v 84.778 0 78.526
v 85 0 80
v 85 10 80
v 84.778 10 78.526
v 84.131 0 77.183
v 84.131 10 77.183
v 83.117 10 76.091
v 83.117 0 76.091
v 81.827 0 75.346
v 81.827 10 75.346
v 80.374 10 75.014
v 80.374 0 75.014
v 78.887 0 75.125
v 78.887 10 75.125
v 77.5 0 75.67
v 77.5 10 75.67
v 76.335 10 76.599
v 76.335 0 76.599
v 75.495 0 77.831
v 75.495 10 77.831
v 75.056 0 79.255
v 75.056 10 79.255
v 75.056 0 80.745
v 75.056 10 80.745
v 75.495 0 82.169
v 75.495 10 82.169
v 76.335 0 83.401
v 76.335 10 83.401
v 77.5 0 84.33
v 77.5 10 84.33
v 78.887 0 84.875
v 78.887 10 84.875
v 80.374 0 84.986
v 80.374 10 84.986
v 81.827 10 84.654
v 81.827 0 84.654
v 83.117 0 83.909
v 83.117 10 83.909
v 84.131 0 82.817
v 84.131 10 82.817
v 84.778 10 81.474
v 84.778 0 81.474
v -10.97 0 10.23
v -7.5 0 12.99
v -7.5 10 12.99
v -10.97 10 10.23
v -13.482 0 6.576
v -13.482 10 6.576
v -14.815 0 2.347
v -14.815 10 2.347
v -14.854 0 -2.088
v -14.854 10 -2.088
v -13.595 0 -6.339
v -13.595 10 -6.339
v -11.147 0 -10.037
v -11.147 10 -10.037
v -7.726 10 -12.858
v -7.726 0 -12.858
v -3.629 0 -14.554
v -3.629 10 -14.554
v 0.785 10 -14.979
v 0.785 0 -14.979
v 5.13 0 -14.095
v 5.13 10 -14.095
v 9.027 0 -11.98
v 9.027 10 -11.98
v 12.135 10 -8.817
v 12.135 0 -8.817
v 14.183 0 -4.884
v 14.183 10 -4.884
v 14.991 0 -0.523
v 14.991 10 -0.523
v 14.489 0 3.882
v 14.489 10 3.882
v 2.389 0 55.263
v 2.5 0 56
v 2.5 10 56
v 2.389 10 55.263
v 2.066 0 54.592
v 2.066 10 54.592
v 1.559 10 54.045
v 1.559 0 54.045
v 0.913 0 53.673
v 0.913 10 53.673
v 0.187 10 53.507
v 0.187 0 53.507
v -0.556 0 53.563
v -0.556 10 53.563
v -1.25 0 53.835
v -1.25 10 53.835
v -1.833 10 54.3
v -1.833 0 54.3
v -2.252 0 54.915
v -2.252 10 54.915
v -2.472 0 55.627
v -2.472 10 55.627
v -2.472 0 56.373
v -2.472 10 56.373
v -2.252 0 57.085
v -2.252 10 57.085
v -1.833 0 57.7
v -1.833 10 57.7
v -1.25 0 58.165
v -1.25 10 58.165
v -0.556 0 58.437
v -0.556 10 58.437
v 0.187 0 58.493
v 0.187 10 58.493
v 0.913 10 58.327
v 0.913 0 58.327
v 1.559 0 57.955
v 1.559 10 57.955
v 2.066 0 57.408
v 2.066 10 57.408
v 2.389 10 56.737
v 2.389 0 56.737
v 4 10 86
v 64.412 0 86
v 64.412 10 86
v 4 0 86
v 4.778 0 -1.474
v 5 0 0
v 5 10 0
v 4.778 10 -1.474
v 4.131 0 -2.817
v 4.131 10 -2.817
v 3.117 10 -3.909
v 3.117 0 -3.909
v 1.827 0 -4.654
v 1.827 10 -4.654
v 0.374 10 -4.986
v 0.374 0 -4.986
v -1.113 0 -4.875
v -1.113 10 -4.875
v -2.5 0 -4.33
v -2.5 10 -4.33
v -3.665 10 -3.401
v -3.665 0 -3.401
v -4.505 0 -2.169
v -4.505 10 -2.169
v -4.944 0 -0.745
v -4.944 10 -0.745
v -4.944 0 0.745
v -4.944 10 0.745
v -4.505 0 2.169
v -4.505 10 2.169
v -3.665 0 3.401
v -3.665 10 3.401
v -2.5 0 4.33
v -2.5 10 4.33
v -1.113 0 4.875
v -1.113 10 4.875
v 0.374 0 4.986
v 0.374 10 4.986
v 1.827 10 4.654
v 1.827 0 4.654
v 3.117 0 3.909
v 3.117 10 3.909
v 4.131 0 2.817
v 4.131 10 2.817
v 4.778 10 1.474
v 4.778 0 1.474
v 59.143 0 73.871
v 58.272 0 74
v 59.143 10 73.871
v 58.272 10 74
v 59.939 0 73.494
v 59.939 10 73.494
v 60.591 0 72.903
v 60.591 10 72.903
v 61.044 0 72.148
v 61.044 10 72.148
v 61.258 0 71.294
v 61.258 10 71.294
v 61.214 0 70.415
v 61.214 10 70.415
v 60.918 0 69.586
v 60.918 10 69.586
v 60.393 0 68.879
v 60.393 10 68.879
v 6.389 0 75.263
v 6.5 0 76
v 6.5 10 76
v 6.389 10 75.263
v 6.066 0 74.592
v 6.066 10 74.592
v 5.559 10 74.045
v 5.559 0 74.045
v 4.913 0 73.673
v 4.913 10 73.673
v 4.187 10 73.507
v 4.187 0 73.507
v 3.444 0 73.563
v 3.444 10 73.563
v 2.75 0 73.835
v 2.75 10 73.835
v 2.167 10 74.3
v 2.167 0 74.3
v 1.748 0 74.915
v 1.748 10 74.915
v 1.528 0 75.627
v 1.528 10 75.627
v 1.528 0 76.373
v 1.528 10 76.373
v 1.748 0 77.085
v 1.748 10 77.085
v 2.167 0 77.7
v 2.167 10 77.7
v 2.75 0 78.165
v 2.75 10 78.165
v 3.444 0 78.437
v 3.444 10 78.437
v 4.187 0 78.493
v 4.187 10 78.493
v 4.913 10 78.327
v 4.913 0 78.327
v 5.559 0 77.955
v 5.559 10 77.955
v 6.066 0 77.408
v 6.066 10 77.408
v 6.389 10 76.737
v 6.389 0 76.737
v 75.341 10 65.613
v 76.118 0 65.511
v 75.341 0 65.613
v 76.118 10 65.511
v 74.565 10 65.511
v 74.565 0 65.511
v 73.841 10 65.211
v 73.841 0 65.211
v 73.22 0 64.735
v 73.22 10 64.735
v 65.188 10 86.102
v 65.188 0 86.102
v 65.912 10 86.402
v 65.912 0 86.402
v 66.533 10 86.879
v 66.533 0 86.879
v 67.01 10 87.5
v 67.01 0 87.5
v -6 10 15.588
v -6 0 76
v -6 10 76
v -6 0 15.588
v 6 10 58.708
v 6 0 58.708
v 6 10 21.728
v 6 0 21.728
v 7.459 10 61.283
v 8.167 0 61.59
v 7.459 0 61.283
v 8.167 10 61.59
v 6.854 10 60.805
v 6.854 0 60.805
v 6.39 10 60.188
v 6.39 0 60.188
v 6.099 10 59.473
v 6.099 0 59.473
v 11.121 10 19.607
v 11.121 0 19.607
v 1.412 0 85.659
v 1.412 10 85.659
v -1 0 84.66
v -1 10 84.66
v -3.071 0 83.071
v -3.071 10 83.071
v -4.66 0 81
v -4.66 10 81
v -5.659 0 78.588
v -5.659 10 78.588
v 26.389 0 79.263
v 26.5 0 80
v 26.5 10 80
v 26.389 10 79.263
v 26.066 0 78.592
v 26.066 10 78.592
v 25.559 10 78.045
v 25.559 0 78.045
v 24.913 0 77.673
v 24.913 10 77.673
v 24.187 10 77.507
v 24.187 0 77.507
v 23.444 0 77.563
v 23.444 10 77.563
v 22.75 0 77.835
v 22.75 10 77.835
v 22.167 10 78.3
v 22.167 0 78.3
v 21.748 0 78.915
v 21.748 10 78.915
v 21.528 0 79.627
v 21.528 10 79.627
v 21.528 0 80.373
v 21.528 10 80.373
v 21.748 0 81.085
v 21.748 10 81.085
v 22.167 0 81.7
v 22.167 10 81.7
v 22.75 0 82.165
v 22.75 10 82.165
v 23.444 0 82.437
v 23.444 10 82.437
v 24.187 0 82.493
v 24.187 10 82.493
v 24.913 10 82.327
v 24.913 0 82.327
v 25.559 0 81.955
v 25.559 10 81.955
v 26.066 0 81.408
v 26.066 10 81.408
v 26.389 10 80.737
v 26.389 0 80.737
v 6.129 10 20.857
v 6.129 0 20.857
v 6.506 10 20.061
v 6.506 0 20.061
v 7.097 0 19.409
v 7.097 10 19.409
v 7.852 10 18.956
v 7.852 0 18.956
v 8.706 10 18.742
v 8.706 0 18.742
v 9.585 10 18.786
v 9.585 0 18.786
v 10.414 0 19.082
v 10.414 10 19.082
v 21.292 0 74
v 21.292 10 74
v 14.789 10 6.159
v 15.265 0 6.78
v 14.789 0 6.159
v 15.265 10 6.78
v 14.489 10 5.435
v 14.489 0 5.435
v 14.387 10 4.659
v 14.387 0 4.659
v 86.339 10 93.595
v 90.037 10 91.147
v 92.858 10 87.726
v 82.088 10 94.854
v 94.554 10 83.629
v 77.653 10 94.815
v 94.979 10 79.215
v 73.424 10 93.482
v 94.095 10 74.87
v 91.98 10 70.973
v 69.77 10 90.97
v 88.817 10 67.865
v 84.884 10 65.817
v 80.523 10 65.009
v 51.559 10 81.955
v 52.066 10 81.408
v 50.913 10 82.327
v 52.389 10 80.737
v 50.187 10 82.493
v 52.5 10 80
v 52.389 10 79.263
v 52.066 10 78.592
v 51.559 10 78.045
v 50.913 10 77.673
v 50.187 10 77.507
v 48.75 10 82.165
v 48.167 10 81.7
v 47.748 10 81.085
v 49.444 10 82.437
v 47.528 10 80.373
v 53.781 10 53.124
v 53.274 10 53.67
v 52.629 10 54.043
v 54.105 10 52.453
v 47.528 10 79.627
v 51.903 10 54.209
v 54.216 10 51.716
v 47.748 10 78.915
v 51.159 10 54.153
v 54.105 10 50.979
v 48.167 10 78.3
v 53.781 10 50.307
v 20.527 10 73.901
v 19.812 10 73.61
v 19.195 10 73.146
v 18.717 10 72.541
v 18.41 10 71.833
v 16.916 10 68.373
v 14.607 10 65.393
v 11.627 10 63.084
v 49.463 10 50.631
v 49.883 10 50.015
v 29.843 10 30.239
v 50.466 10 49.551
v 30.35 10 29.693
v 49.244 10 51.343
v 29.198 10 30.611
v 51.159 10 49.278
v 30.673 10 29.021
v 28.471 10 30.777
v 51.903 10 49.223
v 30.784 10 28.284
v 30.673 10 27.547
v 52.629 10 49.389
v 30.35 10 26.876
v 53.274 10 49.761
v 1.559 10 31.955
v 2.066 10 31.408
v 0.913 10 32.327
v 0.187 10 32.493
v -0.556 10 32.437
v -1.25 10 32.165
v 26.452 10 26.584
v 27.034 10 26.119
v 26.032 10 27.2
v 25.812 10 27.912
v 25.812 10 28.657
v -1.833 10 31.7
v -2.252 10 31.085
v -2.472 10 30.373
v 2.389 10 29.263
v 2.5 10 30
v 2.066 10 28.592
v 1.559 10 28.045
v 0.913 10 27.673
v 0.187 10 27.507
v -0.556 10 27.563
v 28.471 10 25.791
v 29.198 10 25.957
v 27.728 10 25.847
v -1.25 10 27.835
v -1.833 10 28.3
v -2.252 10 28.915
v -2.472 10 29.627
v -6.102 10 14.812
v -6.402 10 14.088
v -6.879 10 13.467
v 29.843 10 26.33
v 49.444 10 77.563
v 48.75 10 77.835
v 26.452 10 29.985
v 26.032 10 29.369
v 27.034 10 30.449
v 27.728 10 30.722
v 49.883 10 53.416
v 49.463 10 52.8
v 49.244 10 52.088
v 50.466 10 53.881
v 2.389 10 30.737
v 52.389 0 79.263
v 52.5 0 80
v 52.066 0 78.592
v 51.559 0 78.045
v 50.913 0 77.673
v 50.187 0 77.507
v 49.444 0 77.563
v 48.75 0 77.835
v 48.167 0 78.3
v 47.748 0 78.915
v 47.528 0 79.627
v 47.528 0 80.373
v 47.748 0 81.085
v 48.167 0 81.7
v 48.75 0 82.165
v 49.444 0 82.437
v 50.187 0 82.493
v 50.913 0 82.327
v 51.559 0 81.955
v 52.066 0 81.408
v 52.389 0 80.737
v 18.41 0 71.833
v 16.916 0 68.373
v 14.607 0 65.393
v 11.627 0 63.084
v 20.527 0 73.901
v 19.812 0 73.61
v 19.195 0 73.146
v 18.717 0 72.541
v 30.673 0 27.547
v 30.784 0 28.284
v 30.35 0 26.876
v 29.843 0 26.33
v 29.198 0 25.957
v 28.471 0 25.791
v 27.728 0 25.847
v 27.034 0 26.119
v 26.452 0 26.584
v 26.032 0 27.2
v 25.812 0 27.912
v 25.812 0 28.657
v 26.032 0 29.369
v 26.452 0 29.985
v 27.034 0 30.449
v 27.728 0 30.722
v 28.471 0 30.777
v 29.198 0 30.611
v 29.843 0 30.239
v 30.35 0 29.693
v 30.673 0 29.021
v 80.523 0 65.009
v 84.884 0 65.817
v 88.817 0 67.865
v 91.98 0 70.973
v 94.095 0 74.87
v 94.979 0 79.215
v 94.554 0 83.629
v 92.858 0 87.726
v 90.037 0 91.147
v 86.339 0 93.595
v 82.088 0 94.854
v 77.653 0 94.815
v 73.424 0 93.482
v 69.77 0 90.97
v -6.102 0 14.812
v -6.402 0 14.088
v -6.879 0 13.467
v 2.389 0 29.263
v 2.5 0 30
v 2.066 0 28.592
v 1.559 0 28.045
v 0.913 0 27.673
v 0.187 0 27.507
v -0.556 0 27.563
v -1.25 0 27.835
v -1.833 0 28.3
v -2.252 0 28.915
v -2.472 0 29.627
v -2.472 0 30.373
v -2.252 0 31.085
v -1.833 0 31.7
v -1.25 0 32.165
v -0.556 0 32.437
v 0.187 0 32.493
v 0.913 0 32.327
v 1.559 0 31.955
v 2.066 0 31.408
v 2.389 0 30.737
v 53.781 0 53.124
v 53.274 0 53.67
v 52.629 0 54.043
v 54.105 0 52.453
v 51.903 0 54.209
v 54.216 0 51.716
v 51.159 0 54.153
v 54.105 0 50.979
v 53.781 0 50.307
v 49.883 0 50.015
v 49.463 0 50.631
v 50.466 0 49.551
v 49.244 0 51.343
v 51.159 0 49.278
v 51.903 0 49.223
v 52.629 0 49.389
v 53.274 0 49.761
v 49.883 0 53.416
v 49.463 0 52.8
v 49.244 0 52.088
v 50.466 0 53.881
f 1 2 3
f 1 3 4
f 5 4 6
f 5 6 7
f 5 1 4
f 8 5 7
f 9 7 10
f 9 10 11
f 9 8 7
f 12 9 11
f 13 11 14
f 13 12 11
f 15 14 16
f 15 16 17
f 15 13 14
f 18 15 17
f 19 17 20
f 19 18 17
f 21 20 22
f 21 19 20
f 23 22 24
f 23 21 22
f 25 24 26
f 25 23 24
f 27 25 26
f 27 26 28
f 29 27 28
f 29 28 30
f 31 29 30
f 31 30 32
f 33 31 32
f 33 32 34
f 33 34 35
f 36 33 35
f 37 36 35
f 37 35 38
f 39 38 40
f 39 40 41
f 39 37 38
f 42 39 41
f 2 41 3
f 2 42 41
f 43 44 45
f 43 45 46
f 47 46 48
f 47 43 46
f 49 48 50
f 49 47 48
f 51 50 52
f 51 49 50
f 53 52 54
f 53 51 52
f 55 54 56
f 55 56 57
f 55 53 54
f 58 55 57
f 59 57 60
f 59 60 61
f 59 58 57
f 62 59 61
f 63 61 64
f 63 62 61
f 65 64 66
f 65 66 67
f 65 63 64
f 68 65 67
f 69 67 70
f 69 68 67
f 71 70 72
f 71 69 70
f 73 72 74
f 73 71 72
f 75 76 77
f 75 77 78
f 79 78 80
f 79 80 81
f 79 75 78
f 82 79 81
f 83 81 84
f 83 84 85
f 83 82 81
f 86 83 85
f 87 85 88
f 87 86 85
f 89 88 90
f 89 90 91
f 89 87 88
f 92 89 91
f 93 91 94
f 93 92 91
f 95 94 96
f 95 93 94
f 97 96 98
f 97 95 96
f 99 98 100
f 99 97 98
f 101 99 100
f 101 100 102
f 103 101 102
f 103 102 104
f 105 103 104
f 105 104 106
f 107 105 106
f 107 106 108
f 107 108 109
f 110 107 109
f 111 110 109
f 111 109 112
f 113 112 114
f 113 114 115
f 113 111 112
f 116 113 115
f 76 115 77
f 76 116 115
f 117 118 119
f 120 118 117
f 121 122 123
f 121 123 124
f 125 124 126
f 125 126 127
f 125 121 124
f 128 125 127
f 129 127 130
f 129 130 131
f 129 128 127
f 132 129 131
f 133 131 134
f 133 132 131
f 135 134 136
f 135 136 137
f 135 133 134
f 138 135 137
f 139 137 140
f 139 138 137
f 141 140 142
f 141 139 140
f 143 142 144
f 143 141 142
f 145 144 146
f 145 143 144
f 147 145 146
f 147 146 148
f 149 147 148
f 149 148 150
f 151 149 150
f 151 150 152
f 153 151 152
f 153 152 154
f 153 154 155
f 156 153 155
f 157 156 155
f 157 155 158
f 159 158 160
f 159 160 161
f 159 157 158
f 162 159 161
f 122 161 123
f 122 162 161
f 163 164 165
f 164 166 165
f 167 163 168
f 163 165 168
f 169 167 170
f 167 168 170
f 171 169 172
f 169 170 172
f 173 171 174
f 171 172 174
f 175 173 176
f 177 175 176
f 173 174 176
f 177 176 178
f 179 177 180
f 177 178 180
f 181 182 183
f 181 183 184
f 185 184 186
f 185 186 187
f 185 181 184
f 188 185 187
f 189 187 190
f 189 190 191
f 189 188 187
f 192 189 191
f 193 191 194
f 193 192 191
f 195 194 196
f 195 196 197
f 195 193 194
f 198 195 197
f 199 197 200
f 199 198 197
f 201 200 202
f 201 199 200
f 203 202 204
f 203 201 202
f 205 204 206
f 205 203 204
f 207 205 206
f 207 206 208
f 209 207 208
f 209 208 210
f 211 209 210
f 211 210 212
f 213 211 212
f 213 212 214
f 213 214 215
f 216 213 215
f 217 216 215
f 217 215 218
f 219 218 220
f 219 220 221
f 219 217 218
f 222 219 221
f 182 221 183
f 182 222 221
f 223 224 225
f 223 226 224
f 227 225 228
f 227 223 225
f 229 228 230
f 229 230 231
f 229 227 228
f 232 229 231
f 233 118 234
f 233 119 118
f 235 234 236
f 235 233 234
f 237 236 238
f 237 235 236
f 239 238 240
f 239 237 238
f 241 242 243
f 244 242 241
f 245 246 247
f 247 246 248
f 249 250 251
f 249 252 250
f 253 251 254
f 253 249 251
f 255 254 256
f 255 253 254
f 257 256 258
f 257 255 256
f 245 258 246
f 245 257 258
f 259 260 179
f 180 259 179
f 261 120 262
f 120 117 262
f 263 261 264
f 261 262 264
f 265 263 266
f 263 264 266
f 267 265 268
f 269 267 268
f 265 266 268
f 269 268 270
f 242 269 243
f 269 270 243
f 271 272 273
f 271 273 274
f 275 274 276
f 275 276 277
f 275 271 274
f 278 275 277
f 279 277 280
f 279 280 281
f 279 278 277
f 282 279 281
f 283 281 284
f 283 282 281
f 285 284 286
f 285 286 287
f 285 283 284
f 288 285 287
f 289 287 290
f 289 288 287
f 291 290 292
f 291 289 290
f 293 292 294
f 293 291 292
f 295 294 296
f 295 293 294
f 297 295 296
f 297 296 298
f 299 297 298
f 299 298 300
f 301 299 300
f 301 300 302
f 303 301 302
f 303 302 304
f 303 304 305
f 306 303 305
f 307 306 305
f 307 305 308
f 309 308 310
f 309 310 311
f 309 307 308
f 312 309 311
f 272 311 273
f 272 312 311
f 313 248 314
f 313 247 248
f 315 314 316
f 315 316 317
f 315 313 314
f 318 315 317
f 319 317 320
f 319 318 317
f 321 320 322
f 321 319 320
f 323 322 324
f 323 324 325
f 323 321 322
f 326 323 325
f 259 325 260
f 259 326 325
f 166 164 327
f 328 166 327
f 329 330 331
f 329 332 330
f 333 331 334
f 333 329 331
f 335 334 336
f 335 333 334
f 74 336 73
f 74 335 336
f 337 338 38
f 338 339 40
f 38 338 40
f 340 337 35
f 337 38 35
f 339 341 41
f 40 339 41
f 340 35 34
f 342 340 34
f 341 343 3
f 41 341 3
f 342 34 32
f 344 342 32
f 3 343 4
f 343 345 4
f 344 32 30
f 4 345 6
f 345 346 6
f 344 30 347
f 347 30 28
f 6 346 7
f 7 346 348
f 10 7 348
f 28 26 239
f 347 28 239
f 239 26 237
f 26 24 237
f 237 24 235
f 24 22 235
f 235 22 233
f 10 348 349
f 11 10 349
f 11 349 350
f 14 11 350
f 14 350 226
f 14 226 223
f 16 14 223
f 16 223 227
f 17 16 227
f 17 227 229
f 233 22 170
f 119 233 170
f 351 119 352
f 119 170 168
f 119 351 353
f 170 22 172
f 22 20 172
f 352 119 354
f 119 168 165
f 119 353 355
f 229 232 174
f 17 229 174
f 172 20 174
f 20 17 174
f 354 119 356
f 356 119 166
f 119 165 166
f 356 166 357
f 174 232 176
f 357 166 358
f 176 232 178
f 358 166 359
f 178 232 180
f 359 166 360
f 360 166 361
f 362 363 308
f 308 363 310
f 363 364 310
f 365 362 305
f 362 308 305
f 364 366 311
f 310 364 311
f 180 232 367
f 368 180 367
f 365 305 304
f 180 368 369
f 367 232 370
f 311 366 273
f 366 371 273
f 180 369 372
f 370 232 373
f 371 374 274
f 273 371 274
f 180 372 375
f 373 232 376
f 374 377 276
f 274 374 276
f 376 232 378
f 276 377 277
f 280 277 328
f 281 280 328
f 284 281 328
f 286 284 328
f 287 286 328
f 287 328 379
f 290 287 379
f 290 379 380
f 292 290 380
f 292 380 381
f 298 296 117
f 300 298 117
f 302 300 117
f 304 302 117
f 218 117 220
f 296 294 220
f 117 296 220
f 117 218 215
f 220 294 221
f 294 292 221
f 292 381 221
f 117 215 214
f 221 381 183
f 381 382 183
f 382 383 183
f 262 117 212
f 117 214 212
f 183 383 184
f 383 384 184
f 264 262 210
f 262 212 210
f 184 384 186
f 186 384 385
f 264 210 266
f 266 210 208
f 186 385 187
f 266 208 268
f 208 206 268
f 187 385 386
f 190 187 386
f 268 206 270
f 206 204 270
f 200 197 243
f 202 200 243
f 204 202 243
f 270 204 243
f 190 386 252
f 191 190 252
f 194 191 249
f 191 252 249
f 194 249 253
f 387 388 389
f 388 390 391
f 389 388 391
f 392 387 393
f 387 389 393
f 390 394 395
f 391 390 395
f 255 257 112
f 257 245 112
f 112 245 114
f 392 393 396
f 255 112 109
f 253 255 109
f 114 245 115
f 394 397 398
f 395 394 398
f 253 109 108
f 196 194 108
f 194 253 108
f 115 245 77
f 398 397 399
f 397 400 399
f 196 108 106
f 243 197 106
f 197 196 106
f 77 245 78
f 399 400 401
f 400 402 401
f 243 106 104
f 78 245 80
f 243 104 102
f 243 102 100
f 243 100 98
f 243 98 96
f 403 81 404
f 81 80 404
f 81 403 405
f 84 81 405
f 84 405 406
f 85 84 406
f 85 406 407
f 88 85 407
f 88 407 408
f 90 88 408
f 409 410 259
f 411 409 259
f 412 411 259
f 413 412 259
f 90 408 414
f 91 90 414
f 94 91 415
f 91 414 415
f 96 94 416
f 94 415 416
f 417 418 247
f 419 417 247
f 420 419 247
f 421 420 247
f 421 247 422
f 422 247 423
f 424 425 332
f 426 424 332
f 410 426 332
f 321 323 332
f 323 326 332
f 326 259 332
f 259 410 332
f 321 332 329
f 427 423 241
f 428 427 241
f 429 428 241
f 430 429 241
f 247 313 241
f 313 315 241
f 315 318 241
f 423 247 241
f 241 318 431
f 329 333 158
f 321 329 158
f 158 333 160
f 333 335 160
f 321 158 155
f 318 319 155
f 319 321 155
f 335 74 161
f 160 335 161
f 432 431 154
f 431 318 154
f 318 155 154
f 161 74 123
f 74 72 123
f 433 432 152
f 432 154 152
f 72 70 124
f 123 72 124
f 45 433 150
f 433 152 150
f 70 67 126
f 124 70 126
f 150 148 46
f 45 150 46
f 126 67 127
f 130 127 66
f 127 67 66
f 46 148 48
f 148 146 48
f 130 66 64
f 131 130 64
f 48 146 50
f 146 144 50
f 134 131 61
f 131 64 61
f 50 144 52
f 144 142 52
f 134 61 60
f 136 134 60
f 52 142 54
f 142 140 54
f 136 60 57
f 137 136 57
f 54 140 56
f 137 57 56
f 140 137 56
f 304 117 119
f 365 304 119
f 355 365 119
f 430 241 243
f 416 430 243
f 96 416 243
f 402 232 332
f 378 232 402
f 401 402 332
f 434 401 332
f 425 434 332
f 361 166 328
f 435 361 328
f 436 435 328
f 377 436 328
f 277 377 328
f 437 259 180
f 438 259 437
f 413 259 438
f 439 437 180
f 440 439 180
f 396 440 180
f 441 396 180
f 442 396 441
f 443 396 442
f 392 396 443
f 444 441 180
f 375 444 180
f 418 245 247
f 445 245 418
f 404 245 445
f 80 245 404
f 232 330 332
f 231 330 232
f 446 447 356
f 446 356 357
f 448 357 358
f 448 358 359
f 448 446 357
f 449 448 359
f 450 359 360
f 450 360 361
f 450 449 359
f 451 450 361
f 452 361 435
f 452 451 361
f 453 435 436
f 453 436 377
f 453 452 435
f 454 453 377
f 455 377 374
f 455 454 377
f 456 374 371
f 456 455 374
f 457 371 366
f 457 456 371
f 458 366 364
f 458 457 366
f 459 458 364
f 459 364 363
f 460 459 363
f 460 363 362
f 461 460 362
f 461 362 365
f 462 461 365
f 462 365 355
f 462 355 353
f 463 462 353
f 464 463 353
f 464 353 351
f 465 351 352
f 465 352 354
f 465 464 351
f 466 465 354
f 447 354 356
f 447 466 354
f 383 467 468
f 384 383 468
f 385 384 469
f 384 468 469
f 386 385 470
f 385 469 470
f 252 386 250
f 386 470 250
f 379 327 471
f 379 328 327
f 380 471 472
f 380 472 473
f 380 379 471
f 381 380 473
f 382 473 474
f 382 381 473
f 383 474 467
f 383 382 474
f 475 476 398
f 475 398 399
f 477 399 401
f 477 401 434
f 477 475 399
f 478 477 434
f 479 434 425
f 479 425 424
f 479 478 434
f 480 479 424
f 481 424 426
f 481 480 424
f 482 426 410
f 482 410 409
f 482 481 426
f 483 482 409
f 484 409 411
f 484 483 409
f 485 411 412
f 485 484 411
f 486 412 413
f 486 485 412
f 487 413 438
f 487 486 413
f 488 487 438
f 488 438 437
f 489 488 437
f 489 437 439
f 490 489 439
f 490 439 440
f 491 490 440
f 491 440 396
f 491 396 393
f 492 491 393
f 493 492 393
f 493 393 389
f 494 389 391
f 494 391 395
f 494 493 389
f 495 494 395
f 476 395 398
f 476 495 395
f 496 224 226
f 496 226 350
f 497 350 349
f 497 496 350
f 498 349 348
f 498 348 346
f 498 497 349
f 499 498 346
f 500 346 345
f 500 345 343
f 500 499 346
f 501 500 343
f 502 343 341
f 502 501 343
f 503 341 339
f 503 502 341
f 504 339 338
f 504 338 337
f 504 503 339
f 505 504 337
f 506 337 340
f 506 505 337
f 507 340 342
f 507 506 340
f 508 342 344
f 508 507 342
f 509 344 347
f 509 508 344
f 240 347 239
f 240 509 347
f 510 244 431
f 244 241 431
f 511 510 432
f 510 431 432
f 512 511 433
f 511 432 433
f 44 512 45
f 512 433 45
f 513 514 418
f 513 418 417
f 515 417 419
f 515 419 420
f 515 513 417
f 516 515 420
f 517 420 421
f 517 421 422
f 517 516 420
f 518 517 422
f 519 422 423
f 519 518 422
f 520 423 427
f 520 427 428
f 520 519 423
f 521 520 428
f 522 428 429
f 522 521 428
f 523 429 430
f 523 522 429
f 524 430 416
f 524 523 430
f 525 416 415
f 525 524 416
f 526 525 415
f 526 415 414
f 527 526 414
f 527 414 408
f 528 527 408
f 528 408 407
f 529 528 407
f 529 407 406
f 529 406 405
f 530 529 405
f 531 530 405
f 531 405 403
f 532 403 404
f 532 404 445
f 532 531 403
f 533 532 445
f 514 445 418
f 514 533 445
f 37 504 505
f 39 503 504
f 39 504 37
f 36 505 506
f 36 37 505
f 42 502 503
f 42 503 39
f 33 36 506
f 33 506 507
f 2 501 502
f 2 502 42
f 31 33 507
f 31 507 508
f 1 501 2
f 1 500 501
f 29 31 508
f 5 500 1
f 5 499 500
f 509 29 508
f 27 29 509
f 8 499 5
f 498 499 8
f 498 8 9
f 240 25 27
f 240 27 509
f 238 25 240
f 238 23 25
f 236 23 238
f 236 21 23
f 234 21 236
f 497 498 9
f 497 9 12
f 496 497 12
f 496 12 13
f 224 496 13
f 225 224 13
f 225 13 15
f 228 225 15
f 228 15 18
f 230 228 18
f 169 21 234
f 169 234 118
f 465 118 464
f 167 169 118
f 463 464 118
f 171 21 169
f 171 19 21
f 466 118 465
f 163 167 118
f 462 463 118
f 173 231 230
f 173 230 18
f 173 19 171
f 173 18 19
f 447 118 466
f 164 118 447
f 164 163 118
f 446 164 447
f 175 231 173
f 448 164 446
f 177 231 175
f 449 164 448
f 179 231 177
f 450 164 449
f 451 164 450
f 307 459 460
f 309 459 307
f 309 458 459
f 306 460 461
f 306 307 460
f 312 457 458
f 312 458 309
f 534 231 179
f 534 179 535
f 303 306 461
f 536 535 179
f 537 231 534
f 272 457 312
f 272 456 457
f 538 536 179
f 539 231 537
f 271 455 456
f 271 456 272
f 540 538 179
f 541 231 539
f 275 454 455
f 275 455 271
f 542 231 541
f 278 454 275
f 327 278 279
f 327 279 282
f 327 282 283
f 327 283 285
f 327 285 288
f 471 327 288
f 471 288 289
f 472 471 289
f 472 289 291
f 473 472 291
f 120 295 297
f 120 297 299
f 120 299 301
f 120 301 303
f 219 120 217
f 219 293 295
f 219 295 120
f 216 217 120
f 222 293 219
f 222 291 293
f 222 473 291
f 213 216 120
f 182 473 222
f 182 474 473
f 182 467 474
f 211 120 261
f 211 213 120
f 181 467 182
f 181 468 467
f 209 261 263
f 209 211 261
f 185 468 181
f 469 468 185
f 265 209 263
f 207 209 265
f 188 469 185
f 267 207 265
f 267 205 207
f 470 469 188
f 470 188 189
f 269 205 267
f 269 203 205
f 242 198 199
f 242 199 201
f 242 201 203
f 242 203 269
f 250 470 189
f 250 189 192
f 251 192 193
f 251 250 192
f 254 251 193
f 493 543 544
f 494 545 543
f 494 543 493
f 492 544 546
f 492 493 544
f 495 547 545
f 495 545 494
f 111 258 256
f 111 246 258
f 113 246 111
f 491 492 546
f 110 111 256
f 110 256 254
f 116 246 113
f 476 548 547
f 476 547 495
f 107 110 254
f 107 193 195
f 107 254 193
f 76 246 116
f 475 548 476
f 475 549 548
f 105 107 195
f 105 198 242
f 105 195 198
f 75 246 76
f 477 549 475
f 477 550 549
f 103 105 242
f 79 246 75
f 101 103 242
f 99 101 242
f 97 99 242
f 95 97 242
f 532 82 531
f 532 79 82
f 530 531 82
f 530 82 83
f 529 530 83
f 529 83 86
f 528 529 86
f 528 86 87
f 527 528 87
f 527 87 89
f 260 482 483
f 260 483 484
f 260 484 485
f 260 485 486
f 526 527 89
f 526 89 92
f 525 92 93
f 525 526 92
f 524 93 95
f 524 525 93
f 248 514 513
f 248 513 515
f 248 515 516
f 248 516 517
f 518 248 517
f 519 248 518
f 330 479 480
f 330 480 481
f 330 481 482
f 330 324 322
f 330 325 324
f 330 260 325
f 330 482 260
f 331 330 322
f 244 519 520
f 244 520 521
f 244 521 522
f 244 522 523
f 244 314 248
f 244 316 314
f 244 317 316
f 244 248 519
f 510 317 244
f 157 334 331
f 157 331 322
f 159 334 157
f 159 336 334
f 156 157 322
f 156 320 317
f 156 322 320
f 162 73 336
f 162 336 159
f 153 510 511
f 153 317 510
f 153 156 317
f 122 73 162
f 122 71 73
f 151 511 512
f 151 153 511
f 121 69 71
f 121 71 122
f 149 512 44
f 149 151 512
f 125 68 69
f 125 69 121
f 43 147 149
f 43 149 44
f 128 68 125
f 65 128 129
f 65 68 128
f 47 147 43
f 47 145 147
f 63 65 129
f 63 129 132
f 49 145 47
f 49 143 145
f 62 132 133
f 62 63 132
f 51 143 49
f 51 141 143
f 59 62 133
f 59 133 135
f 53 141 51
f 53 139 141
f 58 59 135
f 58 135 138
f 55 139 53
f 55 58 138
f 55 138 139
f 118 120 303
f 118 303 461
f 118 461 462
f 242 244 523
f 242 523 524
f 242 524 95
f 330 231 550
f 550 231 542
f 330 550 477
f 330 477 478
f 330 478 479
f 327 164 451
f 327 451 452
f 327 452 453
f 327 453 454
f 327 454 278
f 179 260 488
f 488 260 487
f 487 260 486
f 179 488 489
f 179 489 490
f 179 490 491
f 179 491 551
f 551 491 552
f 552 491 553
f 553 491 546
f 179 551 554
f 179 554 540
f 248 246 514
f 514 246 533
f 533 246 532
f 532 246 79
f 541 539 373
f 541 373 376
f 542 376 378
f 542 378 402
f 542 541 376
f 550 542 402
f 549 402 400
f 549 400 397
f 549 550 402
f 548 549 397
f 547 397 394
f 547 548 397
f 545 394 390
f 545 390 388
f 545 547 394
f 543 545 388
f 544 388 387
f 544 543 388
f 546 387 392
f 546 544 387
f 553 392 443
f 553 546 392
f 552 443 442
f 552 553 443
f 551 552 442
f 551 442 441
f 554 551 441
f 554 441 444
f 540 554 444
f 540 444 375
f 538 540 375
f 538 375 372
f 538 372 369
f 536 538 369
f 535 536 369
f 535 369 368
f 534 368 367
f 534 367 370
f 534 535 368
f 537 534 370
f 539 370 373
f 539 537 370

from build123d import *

# Parameters (mm, degrees)
SKETCH2_R           = 5
SKETCH2_R_2         = 2.5
BOSS_EXTRUDE1_DEPTH = 10
FILLET1_R           = 10
FILLET2_R           = 3
FILLET3_R           = 3
FILLET4_R           = 3


with BuildPart() as part:
    # Sketch2 → Boss-Extrude1 (new body)
    with BuildSketch(Plane(origin=(0, 0, 0), x_dir=(1, 0, 0), z_dir=(0, 1, 0))):
        with BuildLine():
            Line((66.252272915, -86), (-6, -86))
            Line((-6, -86), (-6, -13.747727085))
            ThreePointArc((-6, -13.747727085), (-5.740251485, 13.858192988), (13.963751735, -5.47847036))
            Line((13.963751735, -5.47847036), (74.52152964, -66.036248265))
            ThreePointArc((74.52152964, -66.036248265), (93.858192988, -85.740251485), (66.252272915, -86))
        make_face()
        Circle(SKETCH2_R, mode=Mode.SUBTRACT)
        with Locations((80, -80)):
            Circle(SKETCH2_R, mode=Mode.SUBTRACT)
        with Locations((50, -80)):
            Circle(SKETCH2_R_2, mode=Mode.SUBTRACT)
        with Locations((24, -80)):
            Circle(SKETCH2_R_2, mode=Mode.SUBTRACT)
        with Locations((0, -56)):
            Circle(SKETCH2_R_2, mode=Mode.SUBTRACT)
        with Locations((0, -30)):
            Circle(SKETCH2_R_2, mode=Mode.SUBTRACT)
        with Locations((28.284271247, -28.284271247)):
            Circle(SKETCH2_R_2, mode=Mode.SUBTRACT)
        with Locations((51.715728753, -51.715728753)):
            Circle(SKETCH2_R_2, mode=Mode.SUBTRACT)
        with Locations((4, -76)):
            Circle(SKETCH2_R_2, mode=Mode.SUBTRACT)
        with BuildLine():
            Line((65.514718626, -74), (18.866068747, -74))
            ThreePointArc((18.866068747, -74), (14.606601718, -65.393398282), (6, -61.133931253))
            Line((6, -61.133931253), (6, -14.485281374))
            Line((6, -14.485281374), (65.514718626, -74))
        make_face(mode=Mode.SUBTRACT)
    extrude(amount=BOSS_EXTRUDE1_DEPTH)

    # Fillet1
    fillet1_edges = [part.edges().sort_by_distance(p)[0] for p in [
        (-6, 5, 86),
    ]]
    fillet(fillet1_edges, radius=FILLET1_R)

    # Fillet2
    fillet2_edges = [part.edges().sort_by_distance(p)[0] for p in [
        (-6, 5, 13.747727085),
        (13.963751735, 5, 5.47847036),
        (74.52152964, 5, 66.036248265),
        (66.252272915, 5, 86),
    ]]
    fillet(fillet2_edges, radius=FILLET2_R)

    # Fillet3
    fillet3_edges = [part.edges().sort_by_distance(p)[0] for p in [
        (65.514718626, 5, 74),
        (6, 5, 14.485281374),
    ]]
    fillet(fillet3_edges, radius=FILLET3_R)

    # Fillet4
    fillet4_edges = [part.edges().sort_by_distance(p)[0] for p in [
        (6, 5, 61.133931253),
        (18.866068747, 5, 74),
    ]]
    fillet(fillet4_edges, radius=FILLET4_R)


solid = part.part
